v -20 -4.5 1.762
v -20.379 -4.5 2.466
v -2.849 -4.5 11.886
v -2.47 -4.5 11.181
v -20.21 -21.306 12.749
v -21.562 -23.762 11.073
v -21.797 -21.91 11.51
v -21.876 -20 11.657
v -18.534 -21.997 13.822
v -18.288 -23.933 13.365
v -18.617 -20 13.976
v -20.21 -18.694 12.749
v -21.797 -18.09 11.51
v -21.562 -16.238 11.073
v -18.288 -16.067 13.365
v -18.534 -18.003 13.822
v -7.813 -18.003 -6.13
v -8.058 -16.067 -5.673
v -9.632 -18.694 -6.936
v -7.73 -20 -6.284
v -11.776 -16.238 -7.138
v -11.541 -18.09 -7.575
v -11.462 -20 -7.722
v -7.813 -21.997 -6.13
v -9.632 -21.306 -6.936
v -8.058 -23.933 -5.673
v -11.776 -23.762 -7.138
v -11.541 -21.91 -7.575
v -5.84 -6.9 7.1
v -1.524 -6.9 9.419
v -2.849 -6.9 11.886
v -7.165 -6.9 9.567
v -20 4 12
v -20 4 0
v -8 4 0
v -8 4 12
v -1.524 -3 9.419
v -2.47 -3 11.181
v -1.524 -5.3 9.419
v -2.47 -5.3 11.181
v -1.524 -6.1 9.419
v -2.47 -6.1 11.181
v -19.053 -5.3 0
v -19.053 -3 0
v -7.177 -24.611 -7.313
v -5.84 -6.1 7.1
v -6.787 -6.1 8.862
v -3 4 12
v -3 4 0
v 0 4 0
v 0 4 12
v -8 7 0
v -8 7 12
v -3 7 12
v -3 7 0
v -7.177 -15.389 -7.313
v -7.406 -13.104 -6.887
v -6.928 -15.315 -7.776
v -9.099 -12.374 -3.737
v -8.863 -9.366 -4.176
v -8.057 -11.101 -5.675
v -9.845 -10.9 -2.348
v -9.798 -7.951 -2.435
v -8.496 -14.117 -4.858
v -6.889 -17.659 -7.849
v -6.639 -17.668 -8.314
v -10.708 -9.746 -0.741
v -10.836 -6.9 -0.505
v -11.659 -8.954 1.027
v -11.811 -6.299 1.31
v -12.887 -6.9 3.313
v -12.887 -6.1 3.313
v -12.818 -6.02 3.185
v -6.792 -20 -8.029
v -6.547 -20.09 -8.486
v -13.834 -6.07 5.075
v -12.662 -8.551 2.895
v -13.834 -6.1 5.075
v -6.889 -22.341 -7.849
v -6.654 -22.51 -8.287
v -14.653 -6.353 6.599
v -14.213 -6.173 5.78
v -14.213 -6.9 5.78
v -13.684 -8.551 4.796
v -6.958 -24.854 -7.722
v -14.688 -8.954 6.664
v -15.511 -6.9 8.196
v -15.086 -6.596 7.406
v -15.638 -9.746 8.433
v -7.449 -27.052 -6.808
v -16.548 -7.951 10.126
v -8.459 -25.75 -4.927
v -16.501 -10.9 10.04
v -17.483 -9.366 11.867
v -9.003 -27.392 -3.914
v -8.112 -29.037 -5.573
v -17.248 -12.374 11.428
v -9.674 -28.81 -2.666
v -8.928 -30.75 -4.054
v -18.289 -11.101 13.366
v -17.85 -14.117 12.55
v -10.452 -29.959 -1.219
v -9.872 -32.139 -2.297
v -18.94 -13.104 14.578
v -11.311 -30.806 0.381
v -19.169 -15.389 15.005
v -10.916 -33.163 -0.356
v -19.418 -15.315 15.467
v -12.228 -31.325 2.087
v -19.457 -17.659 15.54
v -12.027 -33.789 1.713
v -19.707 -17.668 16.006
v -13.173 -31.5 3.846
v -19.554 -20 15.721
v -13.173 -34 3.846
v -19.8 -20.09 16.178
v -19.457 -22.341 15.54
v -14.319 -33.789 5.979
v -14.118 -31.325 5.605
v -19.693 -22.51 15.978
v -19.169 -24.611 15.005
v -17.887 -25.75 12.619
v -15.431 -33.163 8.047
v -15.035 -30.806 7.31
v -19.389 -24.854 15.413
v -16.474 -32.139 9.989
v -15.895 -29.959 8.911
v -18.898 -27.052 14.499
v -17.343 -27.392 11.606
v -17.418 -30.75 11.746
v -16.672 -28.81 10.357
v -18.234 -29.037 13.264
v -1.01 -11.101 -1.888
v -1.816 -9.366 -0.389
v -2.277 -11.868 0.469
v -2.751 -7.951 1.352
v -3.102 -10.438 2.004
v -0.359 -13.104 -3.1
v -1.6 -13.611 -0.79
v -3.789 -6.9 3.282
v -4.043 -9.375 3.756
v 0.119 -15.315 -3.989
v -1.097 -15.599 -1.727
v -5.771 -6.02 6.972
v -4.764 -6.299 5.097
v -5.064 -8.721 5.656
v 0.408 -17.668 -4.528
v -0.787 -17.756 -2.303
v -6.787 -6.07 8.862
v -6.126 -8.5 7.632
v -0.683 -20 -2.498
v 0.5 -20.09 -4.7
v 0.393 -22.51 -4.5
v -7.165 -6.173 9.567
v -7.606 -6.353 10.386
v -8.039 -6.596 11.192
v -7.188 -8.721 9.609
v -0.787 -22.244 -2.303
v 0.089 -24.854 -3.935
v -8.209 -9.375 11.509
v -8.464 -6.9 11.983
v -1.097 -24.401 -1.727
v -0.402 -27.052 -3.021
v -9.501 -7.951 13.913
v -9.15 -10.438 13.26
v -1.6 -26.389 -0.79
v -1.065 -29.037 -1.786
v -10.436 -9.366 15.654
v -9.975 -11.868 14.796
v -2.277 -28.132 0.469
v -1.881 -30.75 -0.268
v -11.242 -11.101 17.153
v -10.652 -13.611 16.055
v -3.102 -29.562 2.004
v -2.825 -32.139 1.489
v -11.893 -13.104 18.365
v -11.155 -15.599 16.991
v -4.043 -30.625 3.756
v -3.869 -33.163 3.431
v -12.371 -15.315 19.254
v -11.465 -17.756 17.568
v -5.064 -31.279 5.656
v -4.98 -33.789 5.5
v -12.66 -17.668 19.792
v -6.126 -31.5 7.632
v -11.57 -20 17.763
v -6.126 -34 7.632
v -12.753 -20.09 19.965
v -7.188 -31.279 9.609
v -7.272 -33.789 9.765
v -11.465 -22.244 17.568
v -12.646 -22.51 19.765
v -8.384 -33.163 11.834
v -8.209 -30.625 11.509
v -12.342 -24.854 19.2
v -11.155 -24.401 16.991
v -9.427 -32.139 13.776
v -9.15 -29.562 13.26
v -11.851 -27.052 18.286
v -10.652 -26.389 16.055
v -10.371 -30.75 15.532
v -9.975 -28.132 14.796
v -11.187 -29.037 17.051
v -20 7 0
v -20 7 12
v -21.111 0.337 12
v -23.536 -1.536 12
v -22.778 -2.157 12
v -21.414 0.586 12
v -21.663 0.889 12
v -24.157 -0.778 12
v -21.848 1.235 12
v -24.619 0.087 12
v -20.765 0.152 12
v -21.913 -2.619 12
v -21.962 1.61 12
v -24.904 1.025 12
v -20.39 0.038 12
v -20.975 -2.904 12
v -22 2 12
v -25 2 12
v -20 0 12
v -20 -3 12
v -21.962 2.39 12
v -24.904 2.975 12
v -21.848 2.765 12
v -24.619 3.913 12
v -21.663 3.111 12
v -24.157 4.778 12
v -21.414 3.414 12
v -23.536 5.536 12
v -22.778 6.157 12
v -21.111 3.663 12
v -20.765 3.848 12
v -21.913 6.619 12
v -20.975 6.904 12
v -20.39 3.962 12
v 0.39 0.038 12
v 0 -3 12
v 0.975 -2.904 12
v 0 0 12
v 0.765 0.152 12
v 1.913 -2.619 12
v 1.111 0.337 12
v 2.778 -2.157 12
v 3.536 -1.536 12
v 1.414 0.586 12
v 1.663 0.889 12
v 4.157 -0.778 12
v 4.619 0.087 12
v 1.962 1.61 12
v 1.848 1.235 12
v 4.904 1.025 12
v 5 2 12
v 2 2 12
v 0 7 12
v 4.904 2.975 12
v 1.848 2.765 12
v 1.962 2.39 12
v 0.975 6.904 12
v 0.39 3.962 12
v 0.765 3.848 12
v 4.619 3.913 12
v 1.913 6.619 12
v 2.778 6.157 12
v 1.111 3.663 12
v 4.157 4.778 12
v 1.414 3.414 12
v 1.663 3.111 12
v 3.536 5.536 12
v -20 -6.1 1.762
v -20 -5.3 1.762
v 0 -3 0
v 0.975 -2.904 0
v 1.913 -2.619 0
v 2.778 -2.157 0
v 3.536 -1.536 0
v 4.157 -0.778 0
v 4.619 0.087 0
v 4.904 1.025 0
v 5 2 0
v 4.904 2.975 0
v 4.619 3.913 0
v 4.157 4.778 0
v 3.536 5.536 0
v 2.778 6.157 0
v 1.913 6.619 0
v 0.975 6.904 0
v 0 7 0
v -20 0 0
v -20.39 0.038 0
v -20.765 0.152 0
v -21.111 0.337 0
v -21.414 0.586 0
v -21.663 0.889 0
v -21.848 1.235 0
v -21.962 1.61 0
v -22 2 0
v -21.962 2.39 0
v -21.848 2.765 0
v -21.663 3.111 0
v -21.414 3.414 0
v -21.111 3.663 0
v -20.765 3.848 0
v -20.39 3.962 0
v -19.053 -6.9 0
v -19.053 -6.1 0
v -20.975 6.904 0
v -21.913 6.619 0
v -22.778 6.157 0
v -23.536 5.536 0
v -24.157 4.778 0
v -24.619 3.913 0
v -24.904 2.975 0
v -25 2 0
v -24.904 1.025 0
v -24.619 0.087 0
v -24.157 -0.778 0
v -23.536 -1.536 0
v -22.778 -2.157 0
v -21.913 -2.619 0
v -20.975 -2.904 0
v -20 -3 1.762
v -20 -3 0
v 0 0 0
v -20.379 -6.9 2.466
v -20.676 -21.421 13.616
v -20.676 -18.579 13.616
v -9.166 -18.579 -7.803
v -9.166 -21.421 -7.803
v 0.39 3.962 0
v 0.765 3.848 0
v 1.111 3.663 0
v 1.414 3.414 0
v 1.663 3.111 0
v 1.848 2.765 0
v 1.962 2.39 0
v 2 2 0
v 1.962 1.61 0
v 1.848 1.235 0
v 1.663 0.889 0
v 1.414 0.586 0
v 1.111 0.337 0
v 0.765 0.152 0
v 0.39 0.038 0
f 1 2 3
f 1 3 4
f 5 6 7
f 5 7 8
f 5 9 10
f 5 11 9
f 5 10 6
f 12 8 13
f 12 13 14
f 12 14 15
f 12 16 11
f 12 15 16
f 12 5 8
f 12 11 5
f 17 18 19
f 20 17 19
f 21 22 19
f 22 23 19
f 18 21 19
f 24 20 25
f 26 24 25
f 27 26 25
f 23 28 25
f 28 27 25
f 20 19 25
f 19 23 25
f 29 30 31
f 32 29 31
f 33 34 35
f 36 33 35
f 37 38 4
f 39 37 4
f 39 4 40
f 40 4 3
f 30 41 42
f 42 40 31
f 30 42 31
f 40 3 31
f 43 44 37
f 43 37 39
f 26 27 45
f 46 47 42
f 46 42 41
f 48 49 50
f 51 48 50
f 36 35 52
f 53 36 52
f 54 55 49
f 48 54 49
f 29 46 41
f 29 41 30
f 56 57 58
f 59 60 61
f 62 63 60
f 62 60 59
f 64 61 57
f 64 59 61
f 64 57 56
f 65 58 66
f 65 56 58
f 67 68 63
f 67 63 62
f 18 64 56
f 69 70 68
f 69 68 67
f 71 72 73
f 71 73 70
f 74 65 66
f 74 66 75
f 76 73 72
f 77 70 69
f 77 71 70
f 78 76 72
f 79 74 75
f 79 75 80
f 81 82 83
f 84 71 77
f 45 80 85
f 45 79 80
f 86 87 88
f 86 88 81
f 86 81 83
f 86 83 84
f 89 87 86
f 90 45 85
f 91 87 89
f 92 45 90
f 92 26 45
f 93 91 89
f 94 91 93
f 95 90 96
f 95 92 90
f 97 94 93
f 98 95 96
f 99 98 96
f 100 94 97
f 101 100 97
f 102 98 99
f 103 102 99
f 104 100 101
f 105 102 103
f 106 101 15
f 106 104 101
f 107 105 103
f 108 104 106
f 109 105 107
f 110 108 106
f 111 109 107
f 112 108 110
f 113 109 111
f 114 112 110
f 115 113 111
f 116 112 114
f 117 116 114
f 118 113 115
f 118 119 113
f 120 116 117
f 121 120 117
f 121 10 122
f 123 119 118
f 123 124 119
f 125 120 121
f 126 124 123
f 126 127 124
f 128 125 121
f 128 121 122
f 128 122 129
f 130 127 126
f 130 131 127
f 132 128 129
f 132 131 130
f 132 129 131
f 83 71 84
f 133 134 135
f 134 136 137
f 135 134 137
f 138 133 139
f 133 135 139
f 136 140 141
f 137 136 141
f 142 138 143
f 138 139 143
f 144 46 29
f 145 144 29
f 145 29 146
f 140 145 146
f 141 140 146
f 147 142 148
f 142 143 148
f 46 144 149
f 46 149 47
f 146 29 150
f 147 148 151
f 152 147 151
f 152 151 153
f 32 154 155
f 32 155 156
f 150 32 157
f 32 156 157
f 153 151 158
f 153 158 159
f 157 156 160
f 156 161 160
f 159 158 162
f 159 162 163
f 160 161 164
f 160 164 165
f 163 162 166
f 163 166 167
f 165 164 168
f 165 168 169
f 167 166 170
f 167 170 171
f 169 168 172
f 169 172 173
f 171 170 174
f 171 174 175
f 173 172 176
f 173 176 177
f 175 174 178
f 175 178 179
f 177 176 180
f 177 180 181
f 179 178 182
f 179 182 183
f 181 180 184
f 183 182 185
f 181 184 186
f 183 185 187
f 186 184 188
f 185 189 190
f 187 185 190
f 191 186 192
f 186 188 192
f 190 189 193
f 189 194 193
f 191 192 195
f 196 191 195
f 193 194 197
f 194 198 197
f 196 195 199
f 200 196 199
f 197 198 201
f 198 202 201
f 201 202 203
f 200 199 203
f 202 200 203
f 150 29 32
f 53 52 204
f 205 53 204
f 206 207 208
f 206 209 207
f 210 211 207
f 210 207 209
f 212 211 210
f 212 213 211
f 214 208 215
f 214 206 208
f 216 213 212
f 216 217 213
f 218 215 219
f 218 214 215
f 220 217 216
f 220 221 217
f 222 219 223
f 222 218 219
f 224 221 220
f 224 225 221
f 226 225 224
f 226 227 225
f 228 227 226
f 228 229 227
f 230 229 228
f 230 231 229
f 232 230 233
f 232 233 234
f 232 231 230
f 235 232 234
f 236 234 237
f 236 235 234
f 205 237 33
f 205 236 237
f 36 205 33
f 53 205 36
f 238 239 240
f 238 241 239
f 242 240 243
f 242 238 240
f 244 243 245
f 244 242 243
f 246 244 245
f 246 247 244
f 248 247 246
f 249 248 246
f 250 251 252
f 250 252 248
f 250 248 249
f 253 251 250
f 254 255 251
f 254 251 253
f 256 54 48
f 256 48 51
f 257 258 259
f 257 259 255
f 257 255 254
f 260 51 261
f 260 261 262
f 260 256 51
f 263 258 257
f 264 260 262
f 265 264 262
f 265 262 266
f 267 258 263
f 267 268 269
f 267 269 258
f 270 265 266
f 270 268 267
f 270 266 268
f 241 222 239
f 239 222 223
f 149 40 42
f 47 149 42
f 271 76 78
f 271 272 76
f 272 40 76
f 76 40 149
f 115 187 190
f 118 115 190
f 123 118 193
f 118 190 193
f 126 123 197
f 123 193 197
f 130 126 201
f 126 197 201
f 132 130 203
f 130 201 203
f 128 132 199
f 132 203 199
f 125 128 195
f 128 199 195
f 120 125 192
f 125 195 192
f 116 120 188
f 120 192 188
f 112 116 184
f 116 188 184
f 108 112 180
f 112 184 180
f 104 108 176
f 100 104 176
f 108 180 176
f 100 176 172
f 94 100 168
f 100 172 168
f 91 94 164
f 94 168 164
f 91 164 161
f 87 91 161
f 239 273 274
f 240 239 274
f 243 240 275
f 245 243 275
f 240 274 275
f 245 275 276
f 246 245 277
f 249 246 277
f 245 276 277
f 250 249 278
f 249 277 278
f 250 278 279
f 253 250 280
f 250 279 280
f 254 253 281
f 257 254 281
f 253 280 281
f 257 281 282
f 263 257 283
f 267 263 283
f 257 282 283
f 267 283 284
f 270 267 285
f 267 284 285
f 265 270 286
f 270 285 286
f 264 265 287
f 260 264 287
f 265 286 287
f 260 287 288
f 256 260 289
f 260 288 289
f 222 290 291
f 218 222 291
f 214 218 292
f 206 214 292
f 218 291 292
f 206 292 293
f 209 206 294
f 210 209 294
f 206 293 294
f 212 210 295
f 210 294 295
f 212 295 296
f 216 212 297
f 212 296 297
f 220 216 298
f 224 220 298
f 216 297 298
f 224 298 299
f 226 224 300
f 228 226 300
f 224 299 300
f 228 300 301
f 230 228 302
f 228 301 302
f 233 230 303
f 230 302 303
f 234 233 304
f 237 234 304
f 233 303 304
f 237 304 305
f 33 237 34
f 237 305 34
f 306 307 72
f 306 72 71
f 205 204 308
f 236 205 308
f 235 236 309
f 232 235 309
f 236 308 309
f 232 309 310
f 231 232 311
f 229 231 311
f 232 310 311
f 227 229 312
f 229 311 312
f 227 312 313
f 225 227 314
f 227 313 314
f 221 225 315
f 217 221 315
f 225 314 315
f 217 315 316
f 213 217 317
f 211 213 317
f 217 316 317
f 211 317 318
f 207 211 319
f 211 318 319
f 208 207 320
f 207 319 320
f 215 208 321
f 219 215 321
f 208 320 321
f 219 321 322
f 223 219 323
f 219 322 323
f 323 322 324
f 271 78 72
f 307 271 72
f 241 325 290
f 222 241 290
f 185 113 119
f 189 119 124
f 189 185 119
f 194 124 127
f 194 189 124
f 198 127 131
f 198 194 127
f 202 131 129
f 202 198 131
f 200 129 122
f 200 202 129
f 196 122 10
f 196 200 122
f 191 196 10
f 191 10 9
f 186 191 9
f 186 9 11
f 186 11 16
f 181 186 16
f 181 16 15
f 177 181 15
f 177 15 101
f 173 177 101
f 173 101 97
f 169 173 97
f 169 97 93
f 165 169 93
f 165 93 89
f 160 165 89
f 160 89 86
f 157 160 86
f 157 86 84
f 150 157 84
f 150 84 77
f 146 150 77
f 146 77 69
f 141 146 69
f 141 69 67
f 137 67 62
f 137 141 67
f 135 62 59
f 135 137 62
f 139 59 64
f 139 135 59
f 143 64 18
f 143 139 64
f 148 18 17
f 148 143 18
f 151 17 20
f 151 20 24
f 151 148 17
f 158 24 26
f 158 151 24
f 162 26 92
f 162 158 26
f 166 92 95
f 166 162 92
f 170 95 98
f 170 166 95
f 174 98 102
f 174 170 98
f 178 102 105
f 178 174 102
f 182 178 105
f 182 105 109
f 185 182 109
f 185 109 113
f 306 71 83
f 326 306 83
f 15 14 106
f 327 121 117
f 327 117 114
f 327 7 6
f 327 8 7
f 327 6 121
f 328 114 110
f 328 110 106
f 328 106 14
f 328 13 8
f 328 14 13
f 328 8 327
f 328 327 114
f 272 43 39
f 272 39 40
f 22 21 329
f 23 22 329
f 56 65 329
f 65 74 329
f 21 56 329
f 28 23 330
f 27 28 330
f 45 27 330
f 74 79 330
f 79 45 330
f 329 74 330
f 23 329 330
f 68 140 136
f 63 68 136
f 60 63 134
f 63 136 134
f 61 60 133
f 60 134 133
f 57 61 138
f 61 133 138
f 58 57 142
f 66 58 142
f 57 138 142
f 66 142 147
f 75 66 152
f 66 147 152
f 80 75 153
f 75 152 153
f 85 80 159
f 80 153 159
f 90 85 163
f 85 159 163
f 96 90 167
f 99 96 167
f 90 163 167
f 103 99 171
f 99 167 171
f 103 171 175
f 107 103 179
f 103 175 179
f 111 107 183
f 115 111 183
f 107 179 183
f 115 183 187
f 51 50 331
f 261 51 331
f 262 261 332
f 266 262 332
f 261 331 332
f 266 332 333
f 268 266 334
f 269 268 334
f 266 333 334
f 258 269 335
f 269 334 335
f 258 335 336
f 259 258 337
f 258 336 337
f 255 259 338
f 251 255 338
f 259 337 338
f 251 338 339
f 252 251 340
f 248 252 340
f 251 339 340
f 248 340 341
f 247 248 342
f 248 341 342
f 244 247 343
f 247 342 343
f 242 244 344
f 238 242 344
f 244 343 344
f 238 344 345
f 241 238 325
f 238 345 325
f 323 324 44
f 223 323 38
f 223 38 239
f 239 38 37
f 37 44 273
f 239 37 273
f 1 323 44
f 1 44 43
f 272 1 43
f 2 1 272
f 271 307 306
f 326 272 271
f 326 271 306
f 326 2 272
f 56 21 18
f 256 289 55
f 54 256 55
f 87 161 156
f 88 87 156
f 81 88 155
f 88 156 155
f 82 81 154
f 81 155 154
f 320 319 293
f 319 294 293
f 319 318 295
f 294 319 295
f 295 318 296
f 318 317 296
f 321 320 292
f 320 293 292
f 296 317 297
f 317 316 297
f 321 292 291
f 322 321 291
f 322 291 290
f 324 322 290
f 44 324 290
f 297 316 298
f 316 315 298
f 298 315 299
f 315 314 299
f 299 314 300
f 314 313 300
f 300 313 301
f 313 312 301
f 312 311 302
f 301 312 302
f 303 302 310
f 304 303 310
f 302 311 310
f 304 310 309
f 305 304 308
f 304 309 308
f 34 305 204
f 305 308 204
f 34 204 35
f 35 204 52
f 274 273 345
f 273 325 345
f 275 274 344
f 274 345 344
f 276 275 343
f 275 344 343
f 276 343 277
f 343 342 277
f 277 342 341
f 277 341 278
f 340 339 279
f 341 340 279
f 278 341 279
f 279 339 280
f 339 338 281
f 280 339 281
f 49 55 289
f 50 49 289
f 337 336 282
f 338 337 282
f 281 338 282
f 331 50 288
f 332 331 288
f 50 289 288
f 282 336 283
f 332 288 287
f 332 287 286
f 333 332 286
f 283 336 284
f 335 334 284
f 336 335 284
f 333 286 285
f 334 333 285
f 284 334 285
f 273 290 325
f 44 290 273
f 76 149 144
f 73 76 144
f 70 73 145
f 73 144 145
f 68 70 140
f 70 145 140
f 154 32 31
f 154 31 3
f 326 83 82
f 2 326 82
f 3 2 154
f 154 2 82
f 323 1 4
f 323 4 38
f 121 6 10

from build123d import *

# Parameters (mm, degrees)
F1_DEPTH       = 12
F5_DEPTH       = 19.9
F7_R           = 11.5
F8_DEPTH       = 8
F11_ANGLE_BACK = 20
F11_ANGLE      = 40


with BuildPart() as f1:
    # F0 (on Top) → F1 (new body)
    with BuildSketch(Plane.XY):
        with BuildLine():
            Line((0, 0), (-20, 0))
            ThreePointArc((-20, 0), (-22, 2), (-20, 4))
            Line((-20, 4), (-8, 4))
            Line((-8, 4), (-8, 7))
            Line((-8, 7), (-20, 7))
            ThreePointArc((-20, 7), (-25, 2), (-20, -3))
            Line((-20, -3), (0, -3))
            ThreePointArc((0, -3), (5, 2), (0, 7))
            Line((0, 7), (-3, 7))
            Line((-3, 7), (-3, 4))
            Line((-3, 4), (0, 4))
            ThreePointArc((0, 4), (2, 2), (0, 0))
        make_face()
    extrude(amount=F1_DEPTH)

    # F4 (on line) → F5 (join)
    with BuildSketch(Plane(origin=(-14.7844431916, 0, -7.9443702008), x_dir=(0, -1, 0), z_dir=(-0.8808807435, 0, -0.4733382677))):
        Polygon((3, 11.0186671228), (3, 9.0186671228), (5.3, 9.0186671228), (5.3, 11.0186671228), (6.1, 11.0186671228), (6.1, 9.0186671228), (6.9, 9.0186671228), (6.9, 11.8186671228), (4.5, 11.8186671228), (4.5, 11.0186671228), align=None)
    extrude(amount=-F5_DEPTH)

    # F7 (on offset) → F8 (join)
    with BuildSketch(Plane(origin=(-1.5712320387, 0, -0.8442961852), x_dir=(0, -1, 0), z_dir=(-0.8808807435, 0, -0.4733382677))):
        with BuildLine():
            ThreePointArc((34, 9.6230288318), (22.5099800796, 23.3961911411), (6.9, 14.5616521217))
            Line((6.9, 14.5616521217), (6.9, 4.6844055418))
            ThreePointArc((6.9, 4.6844055418), (22.5099800796, -4.1501334776), (34, 9.6230288318))
        make_face()
        with Locations((20, 9.6230288318)):
            Circle(F7_R, mode=Mode.SUBTRACT)
        with BuildLine():
            Line((6.9, 4.6844055418), (6.9, 14.5616521217))
            ThreePointArc((6.9, 14.5616521217), (6, 9.6230288318), (6.9, 4.6844055418))
        make_face()
    extrude(amount=F8_DEPTH)

    # F10 (on offset) → F11 (revolve)
    with BuildSketch(Plane.XZ.offset(20), mode=Mode.PRIVATE) as f11_sk:
        Polygon((-6.7922217721, -8.029286104), (-7.7298357056, -6.2843900851), (-11.4623919126, -7.7224527269), align=None)
        Polygon((-21.8758338022, 11.6569236308), (-18.6166158629, 13.9758670161), (-19.5542297964, 15.720763035), align=None)
    revolve(f11_sk.sketch.rotate(Axis((-15.3602525801, -20, 2.6705470646), (-0.8808807435, 0, -0.4733382677)), -F11_ANGLE_BACK), axis=Axis((-15.3602525801, -20, 2.6705470646), (-0.8808807435, 0, -0.4733382677)), revolution_arc=F11_ANGLE)


solid = f1.part
